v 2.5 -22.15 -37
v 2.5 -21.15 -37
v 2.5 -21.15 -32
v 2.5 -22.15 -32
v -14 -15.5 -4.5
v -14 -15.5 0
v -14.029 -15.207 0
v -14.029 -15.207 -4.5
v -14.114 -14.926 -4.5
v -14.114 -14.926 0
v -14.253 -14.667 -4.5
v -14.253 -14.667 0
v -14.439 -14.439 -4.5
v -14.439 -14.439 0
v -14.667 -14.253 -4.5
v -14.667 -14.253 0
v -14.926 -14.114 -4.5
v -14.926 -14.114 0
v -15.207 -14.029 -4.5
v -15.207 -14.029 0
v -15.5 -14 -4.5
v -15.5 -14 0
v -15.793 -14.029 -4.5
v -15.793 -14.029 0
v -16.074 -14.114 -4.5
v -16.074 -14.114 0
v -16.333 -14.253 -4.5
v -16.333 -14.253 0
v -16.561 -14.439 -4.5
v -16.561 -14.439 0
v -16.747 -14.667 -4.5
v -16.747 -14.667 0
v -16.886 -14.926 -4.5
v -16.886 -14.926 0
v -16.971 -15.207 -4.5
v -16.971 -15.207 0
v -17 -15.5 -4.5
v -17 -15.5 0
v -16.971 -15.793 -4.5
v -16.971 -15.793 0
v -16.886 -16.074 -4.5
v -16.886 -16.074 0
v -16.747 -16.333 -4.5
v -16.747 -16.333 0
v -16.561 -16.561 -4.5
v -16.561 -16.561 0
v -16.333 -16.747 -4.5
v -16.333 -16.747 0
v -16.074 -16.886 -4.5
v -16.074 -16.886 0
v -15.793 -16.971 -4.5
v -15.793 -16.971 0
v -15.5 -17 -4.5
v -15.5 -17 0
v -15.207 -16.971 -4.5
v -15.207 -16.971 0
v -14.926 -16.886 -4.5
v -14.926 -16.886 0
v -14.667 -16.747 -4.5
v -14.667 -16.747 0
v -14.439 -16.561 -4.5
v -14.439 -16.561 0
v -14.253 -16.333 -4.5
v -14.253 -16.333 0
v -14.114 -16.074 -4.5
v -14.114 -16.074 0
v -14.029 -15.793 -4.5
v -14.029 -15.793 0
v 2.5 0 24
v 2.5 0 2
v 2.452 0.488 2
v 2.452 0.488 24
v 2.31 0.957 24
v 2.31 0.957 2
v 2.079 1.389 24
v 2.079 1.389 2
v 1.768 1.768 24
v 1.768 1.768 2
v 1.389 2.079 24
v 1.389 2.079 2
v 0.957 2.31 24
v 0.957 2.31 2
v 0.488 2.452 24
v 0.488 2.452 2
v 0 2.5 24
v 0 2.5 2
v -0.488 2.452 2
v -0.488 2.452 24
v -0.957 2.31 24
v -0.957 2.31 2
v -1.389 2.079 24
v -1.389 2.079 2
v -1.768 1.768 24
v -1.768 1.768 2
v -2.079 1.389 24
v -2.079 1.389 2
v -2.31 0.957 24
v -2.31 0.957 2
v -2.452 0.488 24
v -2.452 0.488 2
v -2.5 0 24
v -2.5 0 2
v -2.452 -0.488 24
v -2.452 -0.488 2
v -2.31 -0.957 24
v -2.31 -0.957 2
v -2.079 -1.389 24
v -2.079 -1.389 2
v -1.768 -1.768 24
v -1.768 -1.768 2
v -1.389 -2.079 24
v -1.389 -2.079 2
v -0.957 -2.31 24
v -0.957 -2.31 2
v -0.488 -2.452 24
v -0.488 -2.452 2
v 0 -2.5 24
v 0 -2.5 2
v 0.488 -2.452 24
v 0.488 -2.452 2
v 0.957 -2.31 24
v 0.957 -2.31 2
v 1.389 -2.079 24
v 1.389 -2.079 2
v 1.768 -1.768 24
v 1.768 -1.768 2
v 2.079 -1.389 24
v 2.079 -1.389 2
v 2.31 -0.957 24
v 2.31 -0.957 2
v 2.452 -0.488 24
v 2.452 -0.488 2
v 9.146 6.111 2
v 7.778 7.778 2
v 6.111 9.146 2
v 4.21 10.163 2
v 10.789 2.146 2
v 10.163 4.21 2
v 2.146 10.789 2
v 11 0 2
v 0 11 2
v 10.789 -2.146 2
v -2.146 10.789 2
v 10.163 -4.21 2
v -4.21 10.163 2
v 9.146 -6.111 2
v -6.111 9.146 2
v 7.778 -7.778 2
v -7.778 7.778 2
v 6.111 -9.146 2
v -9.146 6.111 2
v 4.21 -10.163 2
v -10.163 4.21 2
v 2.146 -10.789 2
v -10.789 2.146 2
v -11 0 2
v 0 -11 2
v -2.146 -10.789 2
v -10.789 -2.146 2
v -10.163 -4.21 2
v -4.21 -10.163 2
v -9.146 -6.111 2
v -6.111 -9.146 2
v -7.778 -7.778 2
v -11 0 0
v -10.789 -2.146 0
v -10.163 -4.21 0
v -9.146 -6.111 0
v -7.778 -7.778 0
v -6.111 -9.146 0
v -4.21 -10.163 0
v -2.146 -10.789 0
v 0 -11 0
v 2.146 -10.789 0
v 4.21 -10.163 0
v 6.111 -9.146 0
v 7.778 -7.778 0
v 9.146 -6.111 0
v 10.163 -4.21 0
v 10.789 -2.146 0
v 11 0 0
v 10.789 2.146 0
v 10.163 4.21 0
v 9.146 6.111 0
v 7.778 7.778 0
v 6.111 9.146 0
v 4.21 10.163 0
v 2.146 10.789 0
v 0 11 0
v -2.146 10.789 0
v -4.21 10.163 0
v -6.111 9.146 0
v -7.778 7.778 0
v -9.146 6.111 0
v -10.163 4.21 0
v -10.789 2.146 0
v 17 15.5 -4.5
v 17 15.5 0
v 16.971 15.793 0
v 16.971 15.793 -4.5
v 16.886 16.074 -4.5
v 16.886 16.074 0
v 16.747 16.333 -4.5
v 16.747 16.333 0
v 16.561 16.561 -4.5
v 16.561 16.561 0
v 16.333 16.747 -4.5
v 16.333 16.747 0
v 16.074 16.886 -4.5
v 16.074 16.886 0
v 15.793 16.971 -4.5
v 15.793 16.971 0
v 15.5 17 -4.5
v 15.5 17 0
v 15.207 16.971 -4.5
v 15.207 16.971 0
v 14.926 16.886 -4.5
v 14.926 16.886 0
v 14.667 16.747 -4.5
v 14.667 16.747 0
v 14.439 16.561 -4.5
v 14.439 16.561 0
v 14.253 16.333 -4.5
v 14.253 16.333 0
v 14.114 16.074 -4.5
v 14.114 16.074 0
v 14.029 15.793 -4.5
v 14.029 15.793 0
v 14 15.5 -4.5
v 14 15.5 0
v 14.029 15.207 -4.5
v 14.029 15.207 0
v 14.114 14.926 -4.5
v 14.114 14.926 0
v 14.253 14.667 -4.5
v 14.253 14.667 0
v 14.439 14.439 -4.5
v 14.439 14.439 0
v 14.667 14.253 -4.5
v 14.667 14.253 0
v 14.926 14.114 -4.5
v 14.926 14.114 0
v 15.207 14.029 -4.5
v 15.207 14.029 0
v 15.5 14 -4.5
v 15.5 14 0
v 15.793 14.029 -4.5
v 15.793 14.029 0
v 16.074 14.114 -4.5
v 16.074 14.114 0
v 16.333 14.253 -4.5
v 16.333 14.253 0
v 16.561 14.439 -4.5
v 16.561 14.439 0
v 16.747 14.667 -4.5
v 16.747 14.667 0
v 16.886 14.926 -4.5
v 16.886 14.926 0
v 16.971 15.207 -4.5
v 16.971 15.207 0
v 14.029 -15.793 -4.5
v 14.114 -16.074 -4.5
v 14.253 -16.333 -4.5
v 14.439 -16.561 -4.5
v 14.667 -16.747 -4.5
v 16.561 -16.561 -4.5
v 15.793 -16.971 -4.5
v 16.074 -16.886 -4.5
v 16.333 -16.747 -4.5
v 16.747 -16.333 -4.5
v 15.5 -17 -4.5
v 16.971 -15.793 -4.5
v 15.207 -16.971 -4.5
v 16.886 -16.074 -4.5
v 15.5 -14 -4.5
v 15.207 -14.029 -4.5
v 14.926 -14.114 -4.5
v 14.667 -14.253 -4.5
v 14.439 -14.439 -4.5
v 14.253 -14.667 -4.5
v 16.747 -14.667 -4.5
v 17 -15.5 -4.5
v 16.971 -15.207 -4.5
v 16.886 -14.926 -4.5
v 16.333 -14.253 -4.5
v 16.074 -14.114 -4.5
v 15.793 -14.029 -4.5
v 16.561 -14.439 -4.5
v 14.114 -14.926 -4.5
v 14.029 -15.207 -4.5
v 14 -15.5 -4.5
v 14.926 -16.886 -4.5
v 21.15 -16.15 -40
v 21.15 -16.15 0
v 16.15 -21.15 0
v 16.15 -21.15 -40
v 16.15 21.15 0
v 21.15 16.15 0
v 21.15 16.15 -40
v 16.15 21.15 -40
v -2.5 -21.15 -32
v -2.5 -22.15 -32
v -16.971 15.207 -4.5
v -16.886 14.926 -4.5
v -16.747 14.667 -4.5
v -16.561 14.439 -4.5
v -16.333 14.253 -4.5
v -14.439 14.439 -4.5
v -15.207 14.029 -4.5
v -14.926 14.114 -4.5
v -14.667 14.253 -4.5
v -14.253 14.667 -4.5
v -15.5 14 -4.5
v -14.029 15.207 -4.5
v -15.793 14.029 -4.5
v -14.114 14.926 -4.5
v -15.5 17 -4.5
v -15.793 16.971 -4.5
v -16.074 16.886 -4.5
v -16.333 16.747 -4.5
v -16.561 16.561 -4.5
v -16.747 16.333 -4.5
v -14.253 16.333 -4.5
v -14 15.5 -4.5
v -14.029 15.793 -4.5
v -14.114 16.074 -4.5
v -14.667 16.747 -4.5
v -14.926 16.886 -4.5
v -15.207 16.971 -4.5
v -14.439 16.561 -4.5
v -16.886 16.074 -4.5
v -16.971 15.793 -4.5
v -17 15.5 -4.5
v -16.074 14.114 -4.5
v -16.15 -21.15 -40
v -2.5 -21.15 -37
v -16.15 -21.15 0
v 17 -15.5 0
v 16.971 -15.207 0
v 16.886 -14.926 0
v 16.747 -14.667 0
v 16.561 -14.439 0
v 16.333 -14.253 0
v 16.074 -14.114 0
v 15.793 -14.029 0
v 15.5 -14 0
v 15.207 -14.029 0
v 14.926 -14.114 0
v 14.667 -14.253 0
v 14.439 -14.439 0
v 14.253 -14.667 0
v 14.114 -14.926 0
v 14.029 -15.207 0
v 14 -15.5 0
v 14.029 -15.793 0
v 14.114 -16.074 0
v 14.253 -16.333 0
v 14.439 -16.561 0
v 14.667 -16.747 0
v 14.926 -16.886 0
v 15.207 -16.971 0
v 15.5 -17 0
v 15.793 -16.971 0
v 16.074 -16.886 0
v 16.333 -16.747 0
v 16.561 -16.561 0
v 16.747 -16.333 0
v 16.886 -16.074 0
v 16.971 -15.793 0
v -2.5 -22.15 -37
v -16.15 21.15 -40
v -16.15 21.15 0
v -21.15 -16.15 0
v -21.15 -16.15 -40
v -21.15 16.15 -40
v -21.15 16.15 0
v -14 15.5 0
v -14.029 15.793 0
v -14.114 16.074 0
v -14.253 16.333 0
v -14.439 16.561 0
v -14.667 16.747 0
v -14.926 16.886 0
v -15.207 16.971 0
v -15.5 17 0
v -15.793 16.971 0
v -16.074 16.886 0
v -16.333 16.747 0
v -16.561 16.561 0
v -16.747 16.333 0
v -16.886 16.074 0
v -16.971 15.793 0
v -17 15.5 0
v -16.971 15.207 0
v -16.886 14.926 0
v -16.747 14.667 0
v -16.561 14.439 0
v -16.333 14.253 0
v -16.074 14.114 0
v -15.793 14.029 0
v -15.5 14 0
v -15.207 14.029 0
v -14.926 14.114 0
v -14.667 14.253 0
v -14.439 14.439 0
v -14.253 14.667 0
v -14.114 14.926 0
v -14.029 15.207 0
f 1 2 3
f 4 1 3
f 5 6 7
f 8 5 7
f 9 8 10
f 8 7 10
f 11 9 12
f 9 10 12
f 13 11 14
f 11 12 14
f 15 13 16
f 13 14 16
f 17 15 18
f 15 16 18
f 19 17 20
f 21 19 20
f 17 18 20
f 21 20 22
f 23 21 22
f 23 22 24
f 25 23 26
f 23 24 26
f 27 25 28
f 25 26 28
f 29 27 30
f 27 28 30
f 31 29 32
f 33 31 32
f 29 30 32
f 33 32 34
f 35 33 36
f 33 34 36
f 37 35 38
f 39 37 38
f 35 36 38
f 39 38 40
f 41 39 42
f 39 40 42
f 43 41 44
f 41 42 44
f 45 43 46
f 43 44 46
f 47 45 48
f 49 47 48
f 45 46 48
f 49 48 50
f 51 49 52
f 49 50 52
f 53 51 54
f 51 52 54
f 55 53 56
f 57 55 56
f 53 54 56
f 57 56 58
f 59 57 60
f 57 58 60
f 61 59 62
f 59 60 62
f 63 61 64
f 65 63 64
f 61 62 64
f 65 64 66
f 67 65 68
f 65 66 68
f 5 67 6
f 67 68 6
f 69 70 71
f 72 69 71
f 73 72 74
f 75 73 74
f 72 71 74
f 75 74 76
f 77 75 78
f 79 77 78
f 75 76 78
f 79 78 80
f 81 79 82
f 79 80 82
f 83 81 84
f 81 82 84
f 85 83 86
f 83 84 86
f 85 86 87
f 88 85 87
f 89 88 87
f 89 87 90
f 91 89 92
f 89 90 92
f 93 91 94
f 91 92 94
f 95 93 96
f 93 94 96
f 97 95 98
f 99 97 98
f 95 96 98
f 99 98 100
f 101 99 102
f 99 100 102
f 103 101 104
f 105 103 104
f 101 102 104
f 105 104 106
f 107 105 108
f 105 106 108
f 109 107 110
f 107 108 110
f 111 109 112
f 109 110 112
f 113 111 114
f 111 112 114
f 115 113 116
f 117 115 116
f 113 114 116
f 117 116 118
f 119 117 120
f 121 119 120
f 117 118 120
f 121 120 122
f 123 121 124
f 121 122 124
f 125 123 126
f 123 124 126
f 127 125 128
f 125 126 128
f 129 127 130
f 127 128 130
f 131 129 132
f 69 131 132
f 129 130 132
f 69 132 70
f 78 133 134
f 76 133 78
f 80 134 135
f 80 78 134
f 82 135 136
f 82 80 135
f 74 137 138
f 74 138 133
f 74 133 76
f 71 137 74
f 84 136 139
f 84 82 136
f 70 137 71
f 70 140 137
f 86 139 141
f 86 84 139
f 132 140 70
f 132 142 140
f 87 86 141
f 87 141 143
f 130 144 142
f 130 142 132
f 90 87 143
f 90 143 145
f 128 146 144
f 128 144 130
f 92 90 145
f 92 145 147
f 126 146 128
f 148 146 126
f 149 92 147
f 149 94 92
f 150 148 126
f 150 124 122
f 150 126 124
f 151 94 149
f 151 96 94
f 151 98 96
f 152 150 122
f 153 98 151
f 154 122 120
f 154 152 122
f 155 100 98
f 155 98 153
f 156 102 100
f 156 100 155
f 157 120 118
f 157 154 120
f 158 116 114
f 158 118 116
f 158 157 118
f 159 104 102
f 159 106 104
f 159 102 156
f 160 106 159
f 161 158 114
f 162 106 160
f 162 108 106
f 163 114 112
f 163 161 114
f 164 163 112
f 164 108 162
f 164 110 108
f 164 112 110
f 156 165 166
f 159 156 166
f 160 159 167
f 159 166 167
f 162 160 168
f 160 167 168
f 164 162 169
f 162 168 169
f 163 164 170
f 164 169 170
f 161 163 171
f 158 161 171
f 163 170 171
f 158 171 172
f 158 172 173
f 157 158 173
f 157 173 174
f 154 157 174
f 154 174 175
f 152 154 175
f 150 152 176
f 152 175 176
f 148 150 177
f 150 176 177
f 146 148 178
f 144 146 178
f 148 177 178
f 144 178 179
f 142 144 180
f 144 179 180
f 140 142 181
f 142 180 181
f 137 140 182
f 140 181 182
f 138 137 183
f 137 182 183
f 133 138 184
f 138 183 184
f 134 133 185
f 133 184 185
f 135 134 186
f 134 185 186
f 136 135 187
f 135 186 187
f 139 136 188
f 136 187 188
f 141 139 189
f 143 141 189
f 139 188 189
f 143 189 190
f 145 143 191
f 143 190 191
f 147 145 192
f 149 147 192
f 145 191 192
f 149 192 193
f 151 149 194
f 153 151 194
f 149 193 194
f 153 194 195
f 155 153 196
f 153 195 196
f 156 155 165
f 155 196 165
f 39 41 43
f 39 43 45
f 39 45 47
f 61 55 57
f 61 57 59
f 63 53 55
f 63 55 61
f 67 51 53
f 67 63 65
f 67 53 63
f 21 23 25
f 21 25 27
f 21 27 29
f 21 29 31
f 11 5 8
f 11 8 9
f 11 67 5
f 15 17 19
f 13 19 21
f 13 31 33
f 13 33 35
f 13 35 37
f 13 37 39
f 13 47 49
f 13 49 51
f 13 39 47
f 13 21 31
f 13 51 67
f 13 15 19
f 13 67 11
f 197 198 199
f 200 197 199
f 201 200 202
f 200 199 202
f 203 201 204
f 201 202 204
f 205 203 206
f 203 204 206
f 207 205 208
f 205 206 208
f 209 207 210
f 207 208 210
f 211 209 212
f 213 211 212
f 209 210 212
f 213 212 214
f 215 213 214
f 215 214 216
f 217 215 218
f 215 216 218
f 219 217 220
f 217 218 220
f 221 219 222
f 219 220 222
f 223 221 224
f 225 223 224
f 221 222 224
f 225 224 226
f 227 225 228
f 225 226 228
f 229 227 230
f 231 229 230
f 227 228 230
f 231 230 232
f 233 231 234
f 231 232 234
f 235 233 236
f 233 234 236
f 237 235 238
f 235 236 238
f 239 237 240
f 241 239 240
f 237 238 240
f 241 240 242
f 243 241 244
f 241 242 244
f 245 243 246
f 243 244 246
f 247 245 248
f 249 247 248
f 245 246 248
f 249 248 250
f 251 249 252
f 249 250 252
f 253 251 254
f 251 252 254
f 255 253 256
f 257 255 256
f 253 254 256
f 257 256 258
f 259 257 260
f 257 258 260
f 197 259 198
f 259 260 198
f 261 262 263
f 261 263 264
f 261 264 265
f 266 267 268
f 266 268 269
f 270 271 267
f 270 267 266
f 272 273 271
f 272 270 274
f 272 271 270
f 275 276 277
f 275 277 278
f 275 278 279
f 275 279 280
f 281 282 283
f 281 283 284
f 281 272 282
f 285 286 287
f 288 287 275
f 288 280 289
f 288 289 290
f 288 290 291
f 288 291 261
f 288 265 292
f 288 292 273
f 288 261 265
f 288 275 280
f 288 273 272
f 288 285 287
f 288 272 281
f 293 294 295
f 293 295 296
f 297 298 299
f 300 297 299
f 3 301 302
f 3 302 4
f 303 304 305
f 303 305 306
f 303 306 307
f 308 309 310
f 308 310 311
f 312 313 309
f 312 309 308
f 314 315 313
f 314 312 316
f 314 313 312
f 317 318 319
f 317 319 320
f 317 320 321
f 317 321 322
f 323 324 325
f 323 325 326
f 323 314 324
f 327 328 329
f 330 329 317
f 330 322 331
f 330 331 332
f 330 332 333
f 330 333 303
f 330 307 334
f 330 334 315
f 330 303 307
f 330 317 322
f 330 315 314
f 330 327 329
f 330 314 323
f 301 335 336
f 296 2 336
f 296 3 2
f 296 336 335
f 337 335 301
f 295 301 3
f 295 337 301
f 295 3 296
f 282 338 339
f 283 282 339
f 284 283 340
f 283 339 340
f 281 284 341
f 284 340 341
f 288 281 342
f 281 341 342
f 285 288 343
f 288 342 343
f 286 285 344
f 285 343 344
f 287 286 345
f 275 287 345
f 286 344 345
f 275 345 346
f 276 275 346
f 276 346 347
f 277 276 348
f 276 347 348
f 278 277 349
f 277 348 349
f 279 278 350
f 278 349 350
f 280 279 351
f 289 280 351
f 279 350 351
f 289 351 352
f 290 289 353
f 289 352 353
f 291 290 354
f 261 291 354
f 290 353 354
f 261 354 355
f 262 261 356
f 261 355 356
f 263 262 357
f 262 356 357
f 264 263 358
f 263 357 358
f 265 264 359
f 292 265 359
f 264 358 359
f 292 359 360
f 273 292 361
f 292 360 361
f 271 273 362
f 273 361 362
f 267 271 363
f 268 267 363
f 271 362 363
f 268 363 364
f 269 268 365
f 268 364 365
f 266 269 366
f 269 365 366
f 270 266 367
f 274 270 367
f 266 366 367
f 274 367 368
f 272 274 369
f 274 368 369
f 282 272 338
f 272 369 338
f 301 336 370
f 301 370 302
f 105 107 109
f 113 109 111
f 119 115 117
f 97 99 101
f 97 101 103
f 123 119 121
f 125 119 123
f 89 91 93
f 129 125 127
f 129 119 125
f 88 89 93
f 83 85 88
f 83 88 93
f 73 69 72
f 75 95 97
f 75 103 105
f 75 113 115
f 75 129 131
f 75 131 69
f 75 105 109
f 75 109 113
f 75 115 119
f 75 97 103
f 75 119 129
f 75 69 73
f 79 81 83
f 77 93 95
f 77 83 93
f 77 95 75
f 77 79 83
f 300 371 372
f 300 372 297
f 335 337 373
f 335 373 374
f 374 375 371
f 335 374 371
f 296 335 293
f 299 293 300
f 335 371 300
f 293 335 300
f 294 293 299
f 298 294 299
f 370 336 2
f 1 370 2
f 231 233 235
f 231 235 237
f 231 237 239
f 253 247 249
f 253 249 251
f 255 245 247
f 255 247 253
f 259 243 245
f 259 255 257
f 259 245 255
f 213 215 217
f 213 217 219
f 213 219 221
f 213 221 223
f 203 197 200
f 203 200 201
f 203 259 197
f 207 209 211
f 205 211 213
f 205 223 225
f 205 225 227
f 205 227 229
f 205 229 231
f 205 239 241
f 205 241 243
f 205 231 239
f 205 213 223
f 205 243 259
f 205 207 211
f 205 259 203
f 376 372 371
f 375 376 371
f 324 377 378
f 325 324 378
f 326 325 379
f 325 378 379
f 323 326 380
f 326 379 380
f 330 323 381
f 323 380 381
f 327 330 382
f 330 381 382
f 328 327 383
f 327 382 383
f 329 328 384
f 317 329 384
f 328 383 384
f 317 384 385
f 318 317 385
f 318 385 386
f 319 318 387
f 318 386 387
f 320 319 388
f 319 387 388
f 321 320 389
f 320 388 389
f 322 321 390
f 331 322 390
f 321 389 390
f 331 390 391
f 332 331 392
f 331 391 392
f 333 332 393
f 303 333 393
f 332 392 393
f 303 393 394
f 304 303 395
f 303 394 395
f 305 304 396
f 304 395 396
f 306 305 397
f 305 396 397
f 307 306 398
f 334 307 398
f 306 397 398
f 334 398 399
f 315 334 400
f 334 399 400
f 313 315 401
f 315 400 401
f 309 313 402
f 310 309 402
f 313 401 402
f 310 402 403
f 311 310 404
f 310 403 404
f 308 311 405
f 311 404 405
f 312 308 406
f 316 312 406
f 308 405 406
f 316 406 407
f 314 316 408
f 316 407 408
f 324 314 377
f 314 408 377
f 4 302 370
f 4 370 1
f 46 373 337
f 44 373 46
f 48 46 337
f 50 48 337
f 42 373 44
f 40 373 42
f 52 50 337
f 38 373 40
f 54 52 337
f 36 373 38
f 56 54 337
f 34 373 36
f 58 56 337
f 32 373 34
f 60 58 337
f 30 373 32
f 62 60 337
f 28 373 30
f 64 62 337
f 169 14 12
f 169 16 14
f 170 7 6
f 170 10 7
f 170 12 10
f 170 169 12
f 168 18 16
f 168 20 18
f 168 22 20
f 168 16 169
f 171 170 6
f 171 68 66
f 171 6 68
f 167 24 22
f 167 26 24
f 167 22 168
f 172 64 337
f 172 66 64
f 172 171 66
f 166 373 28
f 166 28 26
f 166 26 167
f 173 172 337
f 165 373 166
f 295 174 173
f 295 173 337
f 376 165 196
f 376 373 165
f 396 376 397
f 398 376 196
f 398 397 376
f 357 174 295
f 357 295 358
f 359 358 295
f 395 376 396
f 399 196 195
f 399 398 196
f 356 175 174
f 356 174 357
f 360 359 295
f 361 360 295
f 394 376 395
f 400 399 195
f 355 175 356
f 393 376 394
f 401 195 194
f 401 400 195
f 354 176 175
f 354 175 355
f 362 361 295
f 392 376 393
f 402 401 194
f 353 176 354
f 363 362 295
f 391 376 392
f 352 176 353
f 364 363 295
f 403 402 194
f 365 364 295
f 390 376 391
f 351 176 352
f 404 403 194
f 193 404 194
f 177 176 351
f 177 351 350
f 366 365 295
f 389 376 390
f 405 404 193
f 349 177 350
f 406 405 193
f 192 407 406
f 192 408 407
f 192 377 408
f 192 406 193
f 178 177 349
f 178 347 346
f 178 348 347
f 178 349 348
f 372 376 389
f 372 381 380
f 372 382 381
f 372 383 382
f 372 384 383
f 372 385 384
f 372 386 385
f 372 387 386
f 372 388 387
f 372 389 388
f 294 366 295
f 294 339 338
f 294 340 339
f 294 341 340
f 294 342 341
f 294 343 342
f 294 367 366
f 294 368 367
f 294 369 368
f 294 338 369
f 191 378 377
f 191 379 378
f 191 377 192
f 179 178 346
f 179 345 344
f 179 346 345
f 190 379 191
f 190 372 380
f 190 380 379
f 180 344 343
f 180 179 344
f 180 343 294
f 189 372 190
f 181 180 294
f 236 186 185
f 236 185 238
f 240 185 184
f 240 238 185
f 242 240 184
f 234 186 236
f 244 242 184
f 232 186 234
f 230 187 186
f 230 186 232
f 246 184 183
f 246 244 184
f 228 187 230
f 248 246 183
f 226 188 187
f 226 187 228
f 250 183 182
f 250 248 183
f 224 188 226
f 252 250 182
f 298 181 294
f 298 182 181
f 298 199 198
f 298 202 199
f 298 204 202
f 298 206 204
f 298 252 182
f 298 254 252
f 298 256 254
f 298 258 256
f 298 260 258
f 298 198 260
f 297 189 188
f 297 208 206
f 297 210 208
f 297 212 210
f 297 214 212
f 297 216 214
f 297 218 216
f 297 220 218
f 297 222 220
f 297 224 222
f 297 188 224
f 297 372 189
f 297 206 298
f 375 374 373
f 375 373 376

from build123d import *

# Parameters (mm, degrees)
SKETCH1_W           = 42.3
SKETCH1_H           = 42.3
BOSS_EXTRUDE1_DEPTH = 40
SKETCH2_R           = 11
BOSS_EXTRUDE2_DEPTH = 2
SKETCH3_R           = 2.5
BOSS_EXTRUDE3_DEPTH = 22
SKETCH4_R           = 1.5
CUT_EXTRUDE1_DEPTH  = 4.5
CHAMFER1_SIZE       = 5
SKETCH5_W           = 5
SKETCH5_H           = 5
BOSS_EXTRUDE4_DEPTH = 1


with BuildPart() as part:
    # Sketch1 → Boss-Extrude1 (new body)
    with BuildSketch(Plane.XY):
        Rectangle(SKETCH1_W, SKETCH1_H)
    extrude(amount=-BOSS_EXTRUDE1_DEPTH)

    # Sketch2 → Boss-Extrude2 (add)
    with BuildSketch(Plane.XY):
        with Locations(Location((0, 0, 0), (0, 0, 180))):
            Circle(SKETCH2_R)
    extrude(amount=BOSS_EXTRUDE2_DEPTH)

    # Sketch3 → Boss-Extrude3 (add)
    with BuildSketch(Plane.XY.offset(2)):
        Circle(SKETCH3_R)
    extrude(amount=BOSS_EXTRUDE3_DEPTH)

    # Sketch4 → Cut-Extrude1 (cut)
    with BuildSketch(Plane.XY):
        with Locations((-15.5, 15.5)):
            Circle(SKETCH4_R)
        with Locations((15.5, 15.5)):
            Circle(SKETCH4_R)
        with Locations((15.5, -15.5)):
            Circle(SKETCH4_R)
        with Locations((-15.5, -15.5)):
            Circle(SKETCH4_R)
    extrude(amount=-CUT_EXTRUDE1_DEPTH, mode=Mode.SUBTRACT)

    # Chamfer1
    chamfer1_edges = [part.edges().sort_by_distance(p)[0] for p in [
        (-21.15, 21.15, -20),
        (21.15, 21.15, -20),
        (21.15, -21.15, -20),
        (-21.15, -21.15, -20),
    ]]
    chamfer(chamfer1_edges, length=CHAMFER1_SIZE)

    # Sketch5 → Boss-Extrude4 (add)
    with BuildSketch(Plane.XZ.offset(21.15)):
        with Locations((0, -34.5)):
            Rectangle(SKETCH5_W, SKETCH5_H)
    extrude(amount=BOSS_EXTRUDE4_DEPTH)


solid = part.part
